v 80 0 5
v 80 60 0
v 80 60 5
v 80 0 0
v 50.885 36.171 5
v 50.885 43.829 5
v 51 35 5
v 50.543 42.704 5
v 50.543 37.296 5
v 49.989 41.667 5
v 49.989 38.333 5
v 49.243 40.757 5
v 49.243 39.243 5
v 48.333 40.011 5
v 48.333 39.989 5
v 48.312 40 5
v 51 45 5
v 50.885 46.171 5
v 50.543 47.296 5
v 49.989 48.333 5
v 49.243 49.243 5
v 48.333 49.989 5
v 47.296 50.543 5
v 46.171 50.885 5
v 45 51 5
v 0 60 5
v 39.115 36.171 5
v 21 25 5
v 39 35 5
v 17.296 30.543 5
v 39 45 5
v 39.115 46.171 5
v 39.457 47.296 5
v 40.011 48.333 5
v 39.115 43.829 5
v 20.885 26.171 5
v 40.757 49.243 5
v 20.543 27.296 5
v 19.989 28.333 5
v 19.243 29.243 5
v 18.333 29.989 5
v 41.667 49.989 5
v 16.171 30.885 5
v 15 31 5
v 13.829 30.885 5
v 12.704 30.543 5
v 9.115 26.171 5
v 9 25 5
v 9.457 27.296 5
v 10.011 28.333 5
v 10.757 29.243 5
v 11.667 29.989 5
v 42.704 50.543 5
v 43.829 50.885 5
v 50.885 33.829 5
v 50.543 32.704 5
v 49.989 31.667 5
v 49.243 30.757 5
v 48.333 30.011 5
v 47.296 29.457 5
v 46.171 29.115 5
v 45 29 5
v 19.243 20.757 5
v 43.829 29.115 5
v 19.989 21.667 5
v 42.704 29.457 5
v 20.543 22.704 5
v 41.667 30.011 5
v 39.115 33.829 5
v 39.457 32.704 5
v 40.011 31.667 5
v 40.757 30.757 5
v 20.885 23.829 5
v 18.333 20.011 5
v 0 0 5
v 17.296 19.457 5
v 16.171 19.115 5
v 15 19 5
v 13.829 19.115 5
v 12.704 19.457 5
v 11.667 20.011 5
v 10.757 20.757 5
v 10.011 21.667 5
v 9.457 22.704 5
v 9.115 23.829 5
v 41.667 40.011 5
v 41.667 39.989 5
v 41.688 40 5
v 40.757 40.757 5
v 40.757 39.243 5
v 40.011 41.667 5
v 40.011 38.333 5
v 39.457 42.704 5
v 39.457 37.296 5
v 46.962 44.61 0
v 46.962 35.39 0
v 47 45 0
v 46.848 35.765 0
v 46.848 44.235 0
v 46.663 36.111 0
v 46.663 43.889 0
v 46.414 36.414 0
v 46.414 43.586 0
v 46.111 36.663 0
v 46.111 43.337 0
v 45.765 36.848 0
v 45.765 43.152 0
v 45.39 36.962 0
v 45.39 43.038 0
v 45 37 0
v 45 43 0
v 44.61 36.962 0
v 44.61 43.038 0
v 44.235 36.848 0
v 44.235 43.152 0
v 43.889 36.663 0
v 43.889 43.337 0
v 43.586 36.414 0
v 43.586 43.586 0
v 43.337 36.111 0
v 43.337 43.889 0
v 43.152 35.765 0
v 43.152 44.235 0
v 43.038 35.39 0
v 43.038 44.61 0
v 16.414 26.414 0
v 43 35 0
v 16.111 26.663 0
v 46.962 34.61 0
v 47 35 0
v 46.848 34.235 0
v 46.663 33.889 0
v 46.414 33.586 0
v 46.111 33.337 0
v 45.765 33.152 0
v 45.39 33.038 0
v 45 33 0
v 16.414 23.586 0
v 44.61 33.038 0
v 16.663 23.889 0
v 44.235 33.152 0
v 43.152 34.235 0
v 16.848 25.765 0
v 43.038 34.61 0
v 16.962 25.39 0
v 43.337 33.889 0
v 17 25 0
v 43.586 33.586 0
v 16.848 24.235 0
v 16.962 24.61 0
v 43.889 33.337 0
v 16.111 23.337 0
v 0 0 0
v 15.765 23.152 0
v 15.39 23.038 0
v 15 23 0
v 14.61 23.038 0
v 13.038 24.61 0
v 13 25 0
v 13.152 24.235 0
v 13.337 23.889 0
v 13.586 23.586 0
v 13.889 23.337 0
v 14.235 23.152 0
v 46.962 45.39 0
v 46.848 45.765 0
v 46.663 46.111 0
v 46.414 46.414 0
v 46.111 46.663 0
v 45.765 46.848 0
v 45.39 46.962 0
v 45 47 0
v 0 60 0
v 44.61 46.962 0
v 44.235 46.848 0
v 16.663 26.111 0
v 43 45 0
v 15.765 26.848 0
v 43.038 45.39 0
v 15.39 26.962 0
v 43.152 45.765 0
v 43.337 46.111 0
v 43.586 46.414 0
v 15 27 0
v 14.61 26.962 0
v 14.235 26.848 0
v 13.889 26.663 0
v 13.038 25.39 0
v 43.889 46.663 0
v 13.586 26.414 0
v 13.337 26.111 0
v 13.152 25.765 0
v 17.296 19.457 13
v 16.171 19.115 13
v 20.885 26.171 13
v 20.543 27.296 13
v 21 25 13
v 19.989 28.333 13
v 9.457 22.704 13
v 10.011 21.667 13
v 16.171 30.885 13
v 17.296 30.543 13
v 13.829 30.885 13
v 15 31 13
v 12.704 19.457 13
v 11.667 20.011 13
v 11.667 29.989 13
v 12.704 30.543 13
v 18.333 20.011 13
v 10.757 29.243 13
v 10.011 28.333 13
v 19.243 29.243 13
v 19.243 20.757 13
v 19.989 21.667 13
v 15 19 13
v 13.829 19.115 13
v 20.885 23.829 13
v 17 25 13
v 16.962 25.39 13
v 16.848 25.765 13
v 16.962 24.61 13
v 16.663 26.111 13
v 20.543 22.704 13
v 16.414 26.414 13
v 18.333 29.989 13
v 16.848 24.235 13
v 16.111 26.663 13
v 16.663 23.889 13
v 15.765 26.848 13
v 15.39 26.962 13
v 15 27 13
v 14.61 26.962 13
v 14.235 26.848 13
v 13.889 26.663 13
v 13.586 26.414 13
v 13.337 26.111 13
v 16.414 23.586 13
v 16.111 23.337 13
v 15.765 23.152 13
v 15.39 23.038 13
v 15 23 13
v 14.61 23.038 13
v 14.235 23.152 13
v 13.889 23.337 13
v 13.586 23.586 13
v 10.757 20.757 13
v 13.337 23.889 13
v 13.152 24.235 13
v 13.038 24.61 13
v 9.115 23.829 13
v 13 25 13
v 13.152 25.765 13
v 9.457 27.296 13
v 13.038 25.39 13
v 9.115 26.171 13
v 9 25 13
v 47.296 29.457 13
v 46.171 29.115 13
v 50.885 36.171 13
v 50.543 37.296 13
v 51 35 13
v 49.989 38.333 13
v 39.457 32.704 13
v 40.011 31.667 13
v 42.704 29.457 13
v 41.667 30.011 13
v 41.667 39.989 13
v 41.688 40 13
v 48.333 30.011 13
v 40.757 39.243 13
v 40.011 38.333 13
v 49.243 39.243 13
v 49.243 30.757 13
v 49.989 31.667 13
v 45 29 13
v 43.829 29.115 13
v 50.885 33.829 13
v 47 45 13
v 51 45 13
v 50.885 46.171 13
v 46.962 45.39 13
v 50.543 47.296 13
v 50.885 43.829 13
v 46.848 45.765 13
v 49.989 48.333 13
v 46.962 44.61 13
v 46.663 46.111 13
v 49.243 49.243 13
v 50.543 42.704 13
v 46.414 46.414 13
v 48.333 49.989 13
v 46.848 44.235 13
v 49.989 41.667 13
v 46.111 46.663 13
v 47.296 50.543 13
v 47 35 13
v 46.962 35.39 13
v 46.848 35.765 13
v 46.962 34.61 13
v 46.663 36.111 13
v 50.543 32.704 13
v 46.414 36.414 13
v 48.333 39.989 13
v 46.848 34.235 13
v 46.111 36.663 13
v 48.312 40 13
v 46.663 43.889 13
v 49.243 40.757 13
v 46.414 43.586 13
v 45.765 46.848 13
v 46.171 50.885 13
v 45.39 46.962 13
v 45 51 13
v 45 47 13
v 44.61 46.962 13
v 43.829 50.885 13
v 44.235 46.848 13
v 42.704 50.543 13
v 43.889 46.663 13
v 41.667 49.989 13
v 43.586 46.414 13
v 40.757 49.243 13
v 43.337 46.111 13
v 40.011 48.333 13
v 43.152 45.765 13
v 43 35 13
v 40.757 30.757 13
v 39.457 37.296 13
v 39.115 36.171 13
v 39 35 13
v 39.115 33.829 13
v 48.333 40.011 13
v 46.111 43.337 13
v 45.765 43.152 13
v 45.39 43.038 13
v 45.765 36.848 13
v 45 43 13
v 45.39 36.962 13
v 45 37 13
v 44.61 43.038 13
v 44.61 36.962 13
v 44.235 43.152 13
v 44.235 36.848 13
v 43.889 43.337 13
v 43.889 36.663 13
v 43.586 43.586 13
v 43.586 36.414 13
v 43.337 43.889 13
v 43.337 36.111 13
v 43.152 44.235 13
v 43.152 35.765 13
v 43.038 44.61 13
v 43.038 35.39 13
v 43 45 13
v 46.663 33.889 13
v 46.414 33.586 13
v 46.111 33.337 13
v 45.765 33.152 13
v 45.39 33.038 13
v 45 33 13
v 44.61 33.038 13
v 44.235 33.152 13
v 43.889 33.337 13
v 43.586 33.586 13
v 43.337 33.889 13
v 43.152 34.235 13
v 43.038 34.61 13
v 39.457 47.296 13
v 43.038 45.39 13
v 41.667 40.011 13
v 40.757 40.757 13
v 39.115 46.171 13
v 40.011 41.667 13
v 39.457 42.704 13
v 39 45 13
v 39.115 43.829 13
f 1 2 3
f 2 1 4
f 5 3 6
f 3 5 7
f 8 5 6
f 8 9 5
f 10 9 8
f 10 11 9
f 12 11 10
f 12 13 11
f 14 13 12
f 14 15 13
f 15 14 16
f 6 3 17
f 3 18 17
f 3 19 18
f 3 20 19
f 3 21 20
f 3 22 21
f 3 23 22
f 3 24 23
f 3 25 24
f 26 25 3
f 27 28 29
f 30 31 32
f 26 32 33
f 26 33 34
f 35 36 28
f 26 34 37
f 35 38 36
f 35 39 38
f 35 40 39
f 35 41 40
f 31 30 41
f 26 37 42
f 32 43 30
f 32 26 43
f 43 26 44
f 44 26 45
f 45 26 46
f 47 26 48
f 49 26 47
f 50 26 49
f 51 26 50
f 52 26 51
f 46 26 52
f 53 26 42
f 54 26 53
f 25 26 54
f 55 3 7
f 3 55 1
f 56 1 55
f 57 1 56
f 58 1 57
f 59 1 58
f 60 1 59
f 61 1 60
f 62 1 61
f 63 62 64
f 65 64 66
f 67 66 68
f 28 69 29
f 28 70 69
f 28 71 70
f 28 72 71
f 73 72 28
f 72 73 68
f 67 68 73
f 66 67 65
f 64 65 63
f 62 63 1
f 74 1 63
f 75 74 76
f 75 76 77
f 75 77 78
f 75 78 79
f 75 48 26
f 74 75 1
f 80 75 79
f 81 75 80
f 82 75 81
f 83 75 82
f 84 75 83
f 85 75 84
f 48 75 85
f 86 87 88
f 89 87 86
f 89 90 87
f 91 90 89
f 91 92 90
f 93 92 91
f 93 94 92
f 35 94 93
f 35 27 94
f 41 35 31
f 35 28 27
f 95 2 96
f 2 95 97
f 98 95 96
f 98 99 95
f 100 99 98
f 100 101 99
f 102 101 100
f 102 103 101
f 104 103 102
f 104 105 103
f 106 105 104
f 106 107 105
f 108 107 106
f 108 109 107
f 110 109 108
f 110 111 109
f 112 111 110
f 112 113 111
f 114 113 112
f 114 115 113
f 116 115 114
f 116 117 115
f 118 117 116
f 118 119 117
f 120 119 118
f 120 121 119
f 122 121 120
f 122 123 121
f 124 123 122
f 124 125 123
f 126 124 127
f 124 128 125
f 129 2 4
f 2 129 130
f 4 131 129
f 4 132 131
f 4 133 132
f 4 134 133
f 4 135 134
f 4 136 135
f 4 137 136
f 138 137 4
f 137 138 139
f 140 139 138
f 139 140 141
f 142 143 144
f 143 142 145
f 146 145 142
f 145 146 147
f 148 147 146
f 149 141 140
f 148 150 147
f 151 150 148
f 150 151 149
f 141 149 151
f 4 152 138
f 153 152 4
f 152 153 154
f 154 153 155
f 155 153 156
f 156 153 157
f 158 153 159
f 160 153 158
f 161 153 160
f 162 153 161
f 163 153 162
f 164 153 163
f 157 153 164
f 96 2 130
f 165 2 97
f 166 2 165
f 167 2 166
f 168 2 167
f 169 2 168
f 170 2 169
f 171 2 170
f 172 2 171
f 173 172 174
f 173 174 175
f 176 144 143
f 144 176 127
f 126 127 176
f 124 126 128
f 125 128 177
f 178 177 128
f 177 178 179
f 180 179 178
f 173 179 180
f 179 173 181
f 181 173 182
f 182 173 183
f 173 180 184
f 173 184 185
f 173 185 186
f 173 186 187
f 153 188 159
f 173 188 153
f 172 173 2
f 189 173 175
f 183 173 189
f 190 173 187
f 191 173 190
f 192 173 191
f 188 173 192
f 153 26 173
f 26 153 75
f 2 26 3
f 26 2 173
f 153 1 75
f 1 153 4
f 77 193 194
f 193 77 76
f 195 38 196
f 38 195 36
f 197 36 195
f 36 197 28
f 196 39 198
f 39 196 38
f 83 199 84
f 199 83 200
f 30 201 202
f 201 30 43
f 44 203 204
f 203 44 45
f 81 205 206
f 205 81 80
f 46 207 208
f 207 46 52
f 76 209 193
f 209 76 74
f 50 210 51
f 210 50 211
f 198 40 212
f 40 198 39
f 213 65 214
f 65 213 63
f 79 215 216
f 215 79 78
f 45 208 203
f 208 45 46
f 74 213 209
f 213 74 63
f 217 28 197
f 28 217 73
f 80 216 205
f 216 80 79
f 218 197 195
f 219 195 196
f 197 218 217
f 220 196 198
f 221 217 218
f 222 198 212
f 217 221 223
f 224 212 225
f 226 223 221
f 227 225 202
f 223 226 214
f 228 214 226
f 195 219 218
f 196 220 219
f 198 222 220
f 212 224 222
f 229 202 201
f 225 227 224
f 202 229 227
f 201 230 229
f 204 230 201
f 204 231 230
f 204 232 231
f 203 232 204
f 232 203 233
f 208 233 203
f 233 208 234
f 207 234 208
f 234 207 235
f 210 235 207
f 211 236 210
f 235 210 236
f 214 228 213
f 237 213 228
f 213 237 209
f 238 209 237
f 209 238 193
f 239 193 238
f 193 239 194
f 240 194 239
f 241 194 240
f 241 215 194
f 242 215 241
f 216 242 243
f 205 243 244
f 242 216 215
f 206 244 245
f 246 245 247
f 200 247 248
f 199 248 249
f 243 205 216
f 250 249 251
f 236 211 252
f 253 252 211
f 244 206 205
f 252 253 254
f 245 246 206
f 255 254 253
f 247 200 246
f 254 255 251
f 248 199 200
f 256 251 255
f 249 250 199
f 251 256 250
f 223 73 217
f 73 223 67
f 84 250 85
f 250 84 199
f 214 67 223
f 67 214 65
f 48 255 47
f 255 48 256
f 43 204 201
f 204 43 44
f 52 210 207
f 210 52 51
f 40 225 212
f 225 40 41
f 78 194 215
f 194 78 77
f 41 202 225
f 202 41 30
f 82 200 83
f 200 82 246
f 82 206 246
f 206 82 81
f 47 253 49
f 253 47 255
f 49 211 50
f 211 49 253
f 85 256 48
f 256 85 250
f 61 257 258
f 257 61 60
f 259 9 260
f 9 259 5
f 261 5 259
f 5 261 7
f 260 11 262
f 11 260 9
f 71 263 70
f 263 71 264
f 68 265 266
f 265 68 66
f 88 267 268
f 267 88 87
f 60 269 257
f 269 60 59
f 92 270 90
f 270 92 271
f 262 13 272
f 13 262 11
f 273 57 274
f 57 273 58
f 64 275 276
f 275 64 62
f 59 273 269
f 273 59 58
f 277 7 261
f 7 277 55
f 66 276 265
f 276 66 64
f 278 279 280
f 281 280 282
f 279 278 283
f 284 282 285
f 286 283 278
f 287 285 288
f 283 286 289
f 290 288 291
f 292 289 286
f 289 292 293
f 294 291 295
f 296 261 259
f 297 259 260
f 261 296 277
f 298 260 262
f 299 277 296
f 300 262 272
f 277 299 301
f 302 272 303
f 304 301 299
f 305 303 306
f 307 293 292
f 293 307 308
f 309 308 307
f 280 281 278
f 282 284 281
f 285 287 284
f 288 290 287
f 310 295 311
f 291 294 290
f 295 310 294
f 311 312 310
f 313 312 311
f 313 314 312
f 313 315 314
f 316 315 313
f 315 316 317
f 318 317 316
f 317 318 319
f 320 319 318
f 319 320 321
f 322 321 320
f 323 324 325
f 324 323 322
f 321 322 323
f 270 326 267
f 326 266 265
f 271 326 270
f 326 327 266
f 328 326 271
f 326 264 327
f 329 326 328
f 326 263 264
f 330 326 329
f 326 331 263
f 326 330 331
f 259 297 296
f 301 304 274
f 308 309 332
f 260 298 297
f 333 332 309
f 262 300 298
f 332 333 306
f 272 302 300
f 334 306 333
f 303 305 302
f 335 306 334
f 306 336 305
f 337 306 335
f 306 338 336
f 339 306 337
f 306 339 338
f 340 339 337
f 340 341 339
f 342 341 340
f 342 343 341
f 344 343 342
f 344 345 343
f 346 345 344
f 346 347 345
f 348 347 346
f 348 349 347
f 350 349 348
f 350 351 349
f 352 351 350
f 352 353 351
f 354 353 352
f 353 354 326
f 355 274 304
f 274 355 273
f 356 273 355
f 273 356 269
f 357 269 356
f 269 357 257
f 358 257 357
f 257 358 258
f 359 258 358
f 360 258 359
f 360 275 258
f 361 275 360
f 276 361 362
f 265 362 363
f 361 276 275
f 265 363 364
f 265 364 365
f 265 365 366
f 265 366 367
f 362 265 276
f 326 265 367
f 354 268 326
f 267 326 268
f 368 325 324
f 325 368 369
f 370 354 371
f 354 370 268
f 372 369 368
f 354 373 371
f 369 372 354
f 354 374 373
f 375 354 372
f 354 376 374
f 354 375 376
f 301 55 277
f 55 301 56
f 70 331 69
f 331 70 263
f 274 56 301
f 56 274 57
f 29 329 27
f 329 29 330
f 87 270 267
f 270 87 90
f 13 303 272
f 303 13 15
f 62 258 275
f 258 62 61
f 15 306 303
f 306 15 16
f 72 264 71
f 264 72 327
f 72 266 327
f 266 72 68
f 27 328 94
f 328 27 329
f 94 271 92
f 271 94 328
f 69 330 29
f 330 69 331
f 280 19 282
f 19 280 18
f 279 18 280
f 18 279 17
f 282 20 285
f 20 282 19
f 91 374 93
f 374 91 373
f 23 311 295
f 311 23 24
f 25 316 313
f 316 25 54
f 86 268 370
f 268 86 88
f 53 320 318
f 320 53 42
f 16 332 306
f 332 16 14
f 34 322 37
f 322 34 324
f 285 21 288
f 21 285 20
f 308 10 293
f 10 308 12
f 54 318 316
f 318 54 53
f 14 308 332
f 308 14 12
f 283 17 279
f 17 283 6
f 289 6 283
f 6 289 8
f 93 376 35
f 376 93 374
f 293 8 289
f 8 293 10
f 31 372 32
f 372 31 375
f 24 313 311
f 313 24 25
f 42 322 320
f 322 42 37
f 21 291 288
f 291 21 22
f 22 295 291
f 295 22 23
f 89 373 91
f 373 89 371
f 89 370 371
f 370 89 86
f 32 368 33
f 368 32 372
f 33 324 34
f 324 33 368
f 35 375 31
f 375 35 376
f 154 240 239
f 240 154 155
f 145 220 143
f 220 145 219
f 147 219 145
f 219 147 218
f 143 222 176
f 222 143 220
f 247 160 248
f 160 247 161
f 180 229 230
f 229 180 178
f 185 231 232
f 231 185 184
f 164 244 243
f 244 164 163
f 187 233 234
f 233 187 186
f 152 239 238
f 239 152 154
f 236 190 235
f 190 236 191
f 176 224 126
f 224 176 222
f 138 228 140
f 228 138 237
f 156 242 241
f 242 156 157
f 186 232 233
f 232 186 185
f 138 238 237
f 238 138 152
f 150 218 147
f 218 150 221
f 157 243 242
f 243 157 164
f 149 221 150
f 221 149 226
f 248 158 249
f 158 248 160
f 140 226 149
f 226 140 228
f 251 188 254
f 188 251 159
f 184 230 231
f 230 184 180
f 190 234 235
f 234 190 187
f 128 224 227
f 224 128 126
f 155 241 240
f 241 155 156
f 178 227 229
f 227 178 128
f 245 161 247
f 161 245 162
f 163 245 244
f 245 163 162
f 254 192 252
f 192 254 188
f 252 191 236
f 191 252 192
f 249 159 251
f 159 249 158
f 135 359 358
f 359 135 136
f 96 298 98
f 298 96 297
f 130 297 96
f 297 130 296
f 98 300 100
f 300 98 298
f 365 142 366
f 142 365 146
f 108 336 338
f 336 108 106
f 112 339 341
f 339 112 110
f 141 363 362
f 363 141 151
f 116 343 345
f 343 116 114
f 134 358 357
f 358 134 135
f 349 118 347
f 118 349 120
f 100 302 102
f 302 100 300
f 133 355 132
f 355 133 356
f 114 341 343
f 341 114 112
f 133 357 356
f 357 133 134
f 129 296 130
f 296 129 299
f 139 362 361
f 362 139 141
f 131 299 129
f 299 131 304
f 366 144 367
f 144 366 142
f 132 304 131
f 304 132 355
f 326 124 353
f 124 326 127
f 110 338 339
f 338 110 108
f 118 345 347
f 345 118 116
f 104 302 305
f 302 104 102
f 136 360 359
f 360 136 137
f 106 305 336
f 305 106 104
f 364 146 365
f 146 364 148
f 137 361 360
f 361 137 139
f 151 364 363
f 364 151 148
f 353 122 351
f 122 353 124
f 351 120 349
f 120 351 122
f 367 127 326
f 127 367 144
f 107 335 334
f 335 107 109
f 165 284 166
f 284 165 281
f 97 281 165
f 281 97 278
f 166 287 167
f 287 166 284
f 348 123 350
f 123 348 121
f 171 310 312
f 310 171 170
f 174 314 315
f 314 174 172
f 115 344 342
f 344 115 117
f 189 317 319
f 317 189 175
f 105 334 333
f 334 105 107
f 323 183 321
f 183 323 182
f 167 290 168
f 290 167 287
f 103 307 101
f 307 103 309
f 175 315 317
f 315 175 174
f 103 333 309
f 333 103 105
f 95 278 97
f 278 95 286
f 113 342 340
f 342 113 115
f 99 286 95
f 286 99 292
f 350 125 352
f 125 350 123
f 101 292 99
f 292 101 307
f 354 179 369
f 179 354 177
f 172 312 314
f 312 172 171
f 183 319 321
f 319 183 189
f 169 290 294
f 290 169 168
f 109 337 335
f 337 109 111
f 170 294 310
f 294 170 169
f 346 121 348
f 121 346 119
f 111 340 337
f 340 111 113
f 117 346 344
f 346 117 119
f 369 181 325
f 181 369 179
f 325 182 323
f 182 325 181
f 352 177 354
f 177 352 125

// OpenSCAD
$fn = 32;

// ----------------------------------------------------------------------
// Boss field: plate with bosses at given coordinates
// ----------------------------------------------------------------------

// --- parameters (mm) ---
plate_l = 80;             // plate length, X
plate_w = 60;             // plate width, Y
plate_t = 5;              // plate thickness, Z
boss_d = 12;              // boss diameter
boss_h = 8;               // boss height above the plate
bore_d = 4;               // boss bore

total_h = plate_t + boss_h;  // overall height

difference() {
  union() {
    cube([plate_l, plate_w, plate_t]);
    translate([15, 25, plate_t]) cylinder(h = boss_h, d = boss_d);
    translate([45, 35, plate_t]) cylinder(h = boss_h, d = boss_d);
    translate([45, 45, plate_t]) cylinder(h = boss_h, d = boss_d);
  }
  translate([15, 25, -1]) cylinder(h = total_h + 2, d = bore_d);
  translate([45, 35, -1]) cylinder(h = total_h + 2, d = bore_d);
  translate([45, 45, -1]) cylinder(h = total_h + 2, d = bore_d);
}
